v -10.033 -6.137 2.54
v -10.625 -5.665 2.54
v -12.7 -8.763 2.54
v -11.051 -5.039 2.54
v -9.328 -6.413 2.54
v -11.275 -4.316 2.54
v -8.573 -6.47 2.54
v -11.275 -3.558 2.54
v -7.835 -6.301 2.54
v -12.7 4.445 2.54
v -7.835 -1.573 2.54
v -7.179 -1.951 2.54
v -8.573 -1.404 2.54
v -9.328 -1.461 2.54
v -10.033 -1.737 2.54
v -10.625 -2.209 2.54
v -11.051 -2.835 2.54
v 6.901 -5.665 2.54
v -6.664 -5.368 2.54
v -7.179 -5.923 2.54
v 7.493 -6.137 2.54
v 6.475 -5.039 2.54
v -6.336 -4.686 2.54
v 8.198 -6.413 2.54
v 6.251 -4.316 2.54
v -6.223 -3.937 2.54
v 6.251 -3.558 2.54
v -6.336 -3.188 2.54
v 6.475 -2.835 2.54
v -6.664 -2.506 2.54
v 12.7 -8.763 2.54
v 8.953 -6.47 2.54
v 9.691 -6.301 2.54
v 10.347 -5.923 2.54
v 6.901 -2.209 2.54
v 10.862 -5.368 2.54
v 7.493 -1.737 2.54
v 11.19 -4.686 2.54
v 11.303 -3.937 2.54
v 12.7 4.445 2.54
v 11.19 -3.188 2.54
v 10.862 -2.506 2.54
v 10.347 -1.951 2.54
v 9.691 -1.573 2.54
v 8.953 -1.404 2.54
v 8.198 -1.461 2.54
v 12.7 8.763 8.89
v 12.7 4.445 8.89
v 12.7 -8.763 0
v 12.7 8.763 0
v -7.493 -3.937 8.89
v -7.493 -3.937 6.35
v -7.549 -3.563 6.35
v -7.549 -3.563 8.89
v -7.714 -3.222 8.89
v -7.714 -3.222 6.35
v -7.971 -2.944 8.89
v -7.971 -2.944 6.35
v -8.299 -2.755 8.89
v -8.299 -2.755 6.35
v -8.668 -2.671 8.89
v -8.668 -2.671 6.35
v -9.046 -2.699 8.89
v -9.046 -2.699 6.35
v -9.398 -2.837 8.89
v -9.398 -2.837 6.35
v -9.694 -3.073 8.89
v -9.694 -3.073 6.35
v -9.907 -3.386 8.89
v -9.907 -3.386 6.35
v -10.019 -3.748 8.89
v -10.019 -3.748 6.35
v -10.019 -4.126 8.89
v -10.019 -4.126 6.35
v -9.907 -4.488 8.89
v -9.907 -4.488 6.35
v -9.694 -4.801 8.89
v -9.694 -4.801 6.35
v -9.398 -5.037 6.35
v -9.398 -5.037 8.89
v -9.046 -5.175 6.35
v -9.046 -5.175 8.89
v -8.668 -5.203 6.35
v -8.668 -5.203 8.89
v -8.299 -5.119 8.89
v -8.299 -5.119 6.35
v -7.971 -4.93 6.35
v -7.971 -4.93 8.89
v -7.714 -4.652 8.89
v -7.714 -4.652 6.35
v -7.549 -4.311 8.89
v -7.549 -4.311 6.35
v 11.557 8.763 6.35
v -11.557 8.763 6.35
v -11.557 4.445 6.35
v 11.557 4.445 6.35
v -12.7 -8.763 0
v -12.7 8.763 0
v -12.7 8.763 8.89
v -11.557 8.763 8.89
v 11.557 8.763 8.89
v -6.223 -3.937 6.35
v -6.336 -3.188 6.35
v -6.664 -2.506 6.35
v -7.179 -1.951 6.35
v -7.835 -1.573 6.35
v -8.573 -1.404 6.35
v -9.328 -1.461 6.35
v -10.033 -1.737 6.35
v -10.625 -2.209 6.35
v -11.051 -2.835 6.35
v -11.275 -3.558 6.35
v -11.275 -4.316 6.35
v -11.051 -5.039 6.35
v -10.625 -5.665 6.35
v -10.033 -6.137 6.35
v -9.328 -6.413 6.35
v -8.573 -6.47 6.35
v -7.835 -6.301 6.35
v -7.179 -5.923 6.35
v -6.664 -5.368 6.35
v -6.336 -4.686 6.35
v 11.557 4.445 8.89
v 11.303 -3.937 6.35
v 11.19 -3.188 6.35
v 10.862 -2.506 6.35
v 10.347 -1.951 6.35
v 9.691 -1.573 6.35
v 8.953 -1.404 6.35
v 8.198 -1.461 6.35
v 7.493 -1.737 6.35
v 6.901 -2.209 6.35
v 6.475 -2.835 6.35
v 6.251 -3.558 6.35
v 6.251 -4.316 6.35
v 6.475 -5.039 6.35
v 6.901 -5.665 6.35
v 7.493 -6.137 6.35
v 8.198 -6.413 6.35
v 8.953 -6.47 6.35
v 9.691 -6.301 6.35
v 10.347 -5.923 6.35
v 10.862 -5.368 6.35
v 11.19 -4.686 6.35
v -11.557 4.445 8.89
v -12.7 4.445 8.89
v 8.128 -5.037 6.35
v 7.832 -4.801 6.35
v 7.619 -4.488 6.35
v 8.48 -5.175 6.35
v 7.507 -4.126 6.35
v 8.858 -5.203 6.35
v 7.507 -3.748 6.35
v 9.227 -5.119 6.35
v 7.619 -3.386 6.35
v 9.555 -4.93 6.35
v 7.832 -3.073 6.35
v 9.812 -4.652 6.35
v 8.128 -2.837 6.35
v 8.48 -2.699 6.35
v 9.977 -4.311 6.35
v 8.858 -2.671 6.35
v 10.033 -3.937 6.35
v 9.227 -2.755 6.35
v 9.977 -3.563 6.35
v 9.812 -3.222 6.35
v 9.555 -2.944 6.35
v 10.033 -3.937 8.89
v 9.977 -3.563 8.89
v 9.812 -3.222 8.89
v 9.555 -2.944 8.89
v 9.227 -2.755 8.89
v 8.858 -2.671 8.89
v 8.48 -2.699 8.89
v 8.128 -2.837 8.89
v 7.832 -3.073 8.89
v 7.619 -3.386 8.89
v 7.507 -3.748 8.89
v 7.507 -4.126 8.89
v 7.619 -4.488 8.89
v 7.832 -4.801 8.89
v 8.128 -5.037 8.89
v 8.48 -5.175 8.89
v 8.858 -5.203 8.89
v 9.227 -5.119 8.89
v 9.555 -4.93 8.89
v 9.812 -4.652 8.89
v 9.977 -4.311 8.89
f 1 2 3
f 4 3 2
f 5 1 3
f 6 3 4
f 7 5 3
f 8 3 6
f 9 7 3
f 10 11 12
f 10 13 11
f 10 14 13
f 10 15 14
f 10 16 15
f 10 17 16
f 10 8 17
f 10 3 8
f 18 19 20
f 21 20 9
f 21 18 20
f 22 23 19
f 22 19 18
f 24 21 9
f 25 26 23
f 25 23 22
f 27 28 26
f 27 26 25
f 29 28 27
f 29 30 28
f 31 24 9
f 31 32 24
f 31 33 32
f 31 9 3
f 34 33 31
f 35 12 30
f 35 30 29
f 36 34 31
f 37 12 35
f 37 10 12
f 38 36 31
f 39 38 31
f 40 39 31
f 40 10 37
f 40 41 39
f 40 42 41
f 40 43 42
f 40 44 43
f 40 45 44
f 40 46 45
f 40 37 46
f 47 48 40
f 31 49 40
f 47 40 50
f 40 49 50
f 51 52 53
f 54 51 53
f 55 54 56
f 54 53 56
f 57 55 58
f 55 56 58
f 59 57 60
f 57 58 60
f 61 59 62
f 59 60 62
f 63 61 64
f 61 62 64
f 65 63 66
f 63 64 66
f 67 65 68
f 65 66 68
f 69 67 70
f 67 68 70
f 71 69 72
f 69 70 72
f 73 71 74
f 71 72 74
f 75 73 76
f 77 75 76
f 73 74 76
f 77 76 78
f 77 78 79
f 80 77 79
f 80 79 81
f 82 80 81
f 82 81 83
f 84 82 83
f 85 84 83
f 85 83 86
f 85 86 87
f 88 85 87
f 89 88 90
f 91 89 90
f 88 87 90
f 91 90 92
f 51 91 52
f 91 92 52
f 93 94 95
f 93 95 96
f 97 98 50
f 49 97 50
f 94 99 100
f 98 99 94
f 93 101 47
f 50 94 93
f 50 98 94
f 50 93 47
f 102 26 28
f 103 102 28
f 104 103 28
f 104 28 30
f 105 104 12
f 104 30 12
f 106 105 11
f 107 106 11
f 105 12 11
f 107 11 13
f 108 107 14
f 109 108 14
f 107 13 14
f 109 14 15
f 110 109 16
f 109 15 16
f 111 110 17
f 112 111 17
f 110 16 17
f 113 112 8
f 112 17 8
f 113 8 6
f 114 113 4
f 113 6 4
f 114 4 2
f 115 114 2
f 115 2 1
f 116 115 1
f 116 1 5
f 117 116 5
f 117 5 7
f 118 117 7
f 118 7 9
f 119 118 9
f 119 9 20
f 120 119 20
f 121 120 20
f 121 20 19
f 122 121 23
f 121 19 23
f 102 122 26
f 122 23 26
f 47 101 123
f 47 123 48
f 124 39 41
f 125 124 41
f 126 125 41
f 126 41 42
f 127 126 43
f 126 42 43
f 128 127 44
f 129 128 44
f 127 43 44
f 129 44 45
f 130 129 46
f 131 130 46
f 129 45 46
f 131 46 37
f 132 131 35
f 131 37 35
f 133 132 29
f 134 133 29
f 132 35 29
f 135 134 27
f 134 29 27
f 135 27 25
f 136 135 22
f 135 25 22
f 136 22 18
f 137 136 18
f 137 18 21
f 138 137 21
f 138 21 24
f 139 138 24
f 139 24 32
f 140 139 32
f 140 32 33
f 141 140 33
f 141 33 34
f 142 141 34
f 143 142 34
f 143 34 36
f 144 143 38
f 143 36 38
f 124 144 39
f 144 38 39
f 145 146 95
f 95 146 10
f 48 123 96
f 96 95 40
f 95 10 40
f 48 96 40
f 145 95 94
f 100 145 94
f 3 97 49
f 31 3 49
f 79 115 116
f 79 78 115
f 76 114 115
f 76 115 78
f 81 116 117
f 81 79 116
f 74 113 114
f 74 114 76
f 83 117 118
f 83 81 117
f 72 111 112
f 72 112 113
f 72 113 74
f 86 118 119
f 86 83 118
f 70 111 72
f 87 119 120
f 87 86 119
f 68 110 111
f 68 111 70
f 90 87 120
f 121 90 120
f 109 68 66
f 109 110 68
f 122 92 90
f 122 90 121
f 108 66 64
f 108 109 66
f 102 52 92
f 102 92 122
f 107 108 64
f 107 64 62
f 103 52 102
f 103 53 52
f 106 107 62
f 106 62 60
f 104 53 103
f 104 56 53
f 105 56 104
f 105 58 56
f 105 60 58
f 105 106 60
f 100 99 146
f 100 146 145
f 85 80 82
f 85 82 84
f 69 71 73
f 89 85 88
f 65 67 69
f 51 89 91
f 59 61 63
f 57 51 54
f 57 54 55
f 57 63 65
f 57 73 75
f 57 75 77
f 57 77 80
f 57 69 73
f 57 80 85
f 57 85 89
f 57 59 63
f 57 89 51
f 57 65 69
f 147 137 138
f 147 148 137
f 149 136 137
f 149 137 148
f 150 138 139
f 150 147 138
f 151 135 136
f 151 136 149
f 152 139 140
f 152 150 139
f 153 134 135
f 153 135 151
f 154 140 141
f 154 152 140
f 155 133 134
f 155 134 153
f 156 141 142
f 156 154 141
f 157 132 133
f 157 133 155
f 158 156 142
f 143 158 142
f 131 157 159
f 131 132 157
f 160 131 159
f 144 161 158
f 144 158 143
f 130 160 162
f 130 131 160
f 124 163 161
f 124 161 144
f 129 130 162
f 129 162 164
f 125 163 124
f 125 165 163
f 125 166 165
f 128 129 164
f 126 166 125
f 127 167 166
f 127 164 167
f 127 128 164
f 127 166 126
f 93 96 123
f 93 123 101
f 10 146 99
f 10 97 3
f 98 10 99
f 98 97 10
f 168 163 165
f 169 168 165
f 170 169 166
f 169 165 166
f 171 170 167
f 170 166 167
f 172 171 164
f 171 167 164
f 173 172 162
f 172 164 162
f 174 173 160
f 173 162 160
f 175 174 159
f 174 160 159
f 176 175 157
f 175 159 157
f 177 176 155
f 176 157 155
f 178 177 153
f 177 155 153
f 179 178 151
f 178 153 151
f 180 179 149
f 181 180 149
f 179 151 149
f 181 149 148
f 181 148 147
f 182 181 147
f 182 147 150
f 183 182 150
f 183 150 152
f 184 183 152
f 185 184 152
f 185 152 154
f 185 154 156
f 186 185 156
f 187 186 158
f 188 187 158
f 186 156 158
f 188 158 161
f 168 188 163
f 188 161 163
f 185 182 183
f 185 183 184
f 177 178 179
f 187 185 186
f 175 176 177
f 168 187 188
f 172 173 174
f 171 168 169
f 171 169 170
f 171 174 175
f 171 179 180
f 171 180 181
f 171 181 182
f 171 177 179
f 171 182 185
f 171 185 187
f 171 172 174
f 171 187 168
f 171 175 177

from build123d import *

# Parameters (mm, degrees)
F0_W     = 25.4
F0_H     = 17.526
F1_DEPTH = 2.54
F2_W     = 25.4
F2_H     = 4.318
F2_R     = 2.54
F3_DEPTH = 3.81
F4_W     = 1.143
F4_H     = 4.318
F4_R     = 1.27
F5_DEPTH = 2.54


with BuildPart() as f1:
    # F0 (on Top) → F1 (new body)
    with BuildSketch(Plane.XY):
        Rectangle(F0_W, F0_H)
    extrude(amount=F1_DEPTH)

    # F2 (on face) → F3 (join)
    with BuildSketch(Plane.XY.offset(2.54)):
        with Locations((0, 6.604)):
            Rectangle(F2_W, F2_H)
        with Locations((-8.763, -3.937)):
            Circle(F2_R)
        with Locations((8.763, -3.937)):
            Circle(F2_R)
    extrude(amount=F3_DEPTH)

    # F4 (on face) → F5 (join)
    with BuildSketch(Plane.XY.offset(6.35)):
        with Locations((-12.1285, 6.604)):
            Rectangle(F4_W, F4_H)
        with Locations((12.1285, 6.604)):
            Rectangle(F4_W, F4_H)
        with Locations((-8.763, -3.937)):
            Circle(F4_R)
        with Locations((8.763, -3.937)):
            Circle(F4_R)
    extrude(amount=F5_DEPTH)


solid = f1.part
